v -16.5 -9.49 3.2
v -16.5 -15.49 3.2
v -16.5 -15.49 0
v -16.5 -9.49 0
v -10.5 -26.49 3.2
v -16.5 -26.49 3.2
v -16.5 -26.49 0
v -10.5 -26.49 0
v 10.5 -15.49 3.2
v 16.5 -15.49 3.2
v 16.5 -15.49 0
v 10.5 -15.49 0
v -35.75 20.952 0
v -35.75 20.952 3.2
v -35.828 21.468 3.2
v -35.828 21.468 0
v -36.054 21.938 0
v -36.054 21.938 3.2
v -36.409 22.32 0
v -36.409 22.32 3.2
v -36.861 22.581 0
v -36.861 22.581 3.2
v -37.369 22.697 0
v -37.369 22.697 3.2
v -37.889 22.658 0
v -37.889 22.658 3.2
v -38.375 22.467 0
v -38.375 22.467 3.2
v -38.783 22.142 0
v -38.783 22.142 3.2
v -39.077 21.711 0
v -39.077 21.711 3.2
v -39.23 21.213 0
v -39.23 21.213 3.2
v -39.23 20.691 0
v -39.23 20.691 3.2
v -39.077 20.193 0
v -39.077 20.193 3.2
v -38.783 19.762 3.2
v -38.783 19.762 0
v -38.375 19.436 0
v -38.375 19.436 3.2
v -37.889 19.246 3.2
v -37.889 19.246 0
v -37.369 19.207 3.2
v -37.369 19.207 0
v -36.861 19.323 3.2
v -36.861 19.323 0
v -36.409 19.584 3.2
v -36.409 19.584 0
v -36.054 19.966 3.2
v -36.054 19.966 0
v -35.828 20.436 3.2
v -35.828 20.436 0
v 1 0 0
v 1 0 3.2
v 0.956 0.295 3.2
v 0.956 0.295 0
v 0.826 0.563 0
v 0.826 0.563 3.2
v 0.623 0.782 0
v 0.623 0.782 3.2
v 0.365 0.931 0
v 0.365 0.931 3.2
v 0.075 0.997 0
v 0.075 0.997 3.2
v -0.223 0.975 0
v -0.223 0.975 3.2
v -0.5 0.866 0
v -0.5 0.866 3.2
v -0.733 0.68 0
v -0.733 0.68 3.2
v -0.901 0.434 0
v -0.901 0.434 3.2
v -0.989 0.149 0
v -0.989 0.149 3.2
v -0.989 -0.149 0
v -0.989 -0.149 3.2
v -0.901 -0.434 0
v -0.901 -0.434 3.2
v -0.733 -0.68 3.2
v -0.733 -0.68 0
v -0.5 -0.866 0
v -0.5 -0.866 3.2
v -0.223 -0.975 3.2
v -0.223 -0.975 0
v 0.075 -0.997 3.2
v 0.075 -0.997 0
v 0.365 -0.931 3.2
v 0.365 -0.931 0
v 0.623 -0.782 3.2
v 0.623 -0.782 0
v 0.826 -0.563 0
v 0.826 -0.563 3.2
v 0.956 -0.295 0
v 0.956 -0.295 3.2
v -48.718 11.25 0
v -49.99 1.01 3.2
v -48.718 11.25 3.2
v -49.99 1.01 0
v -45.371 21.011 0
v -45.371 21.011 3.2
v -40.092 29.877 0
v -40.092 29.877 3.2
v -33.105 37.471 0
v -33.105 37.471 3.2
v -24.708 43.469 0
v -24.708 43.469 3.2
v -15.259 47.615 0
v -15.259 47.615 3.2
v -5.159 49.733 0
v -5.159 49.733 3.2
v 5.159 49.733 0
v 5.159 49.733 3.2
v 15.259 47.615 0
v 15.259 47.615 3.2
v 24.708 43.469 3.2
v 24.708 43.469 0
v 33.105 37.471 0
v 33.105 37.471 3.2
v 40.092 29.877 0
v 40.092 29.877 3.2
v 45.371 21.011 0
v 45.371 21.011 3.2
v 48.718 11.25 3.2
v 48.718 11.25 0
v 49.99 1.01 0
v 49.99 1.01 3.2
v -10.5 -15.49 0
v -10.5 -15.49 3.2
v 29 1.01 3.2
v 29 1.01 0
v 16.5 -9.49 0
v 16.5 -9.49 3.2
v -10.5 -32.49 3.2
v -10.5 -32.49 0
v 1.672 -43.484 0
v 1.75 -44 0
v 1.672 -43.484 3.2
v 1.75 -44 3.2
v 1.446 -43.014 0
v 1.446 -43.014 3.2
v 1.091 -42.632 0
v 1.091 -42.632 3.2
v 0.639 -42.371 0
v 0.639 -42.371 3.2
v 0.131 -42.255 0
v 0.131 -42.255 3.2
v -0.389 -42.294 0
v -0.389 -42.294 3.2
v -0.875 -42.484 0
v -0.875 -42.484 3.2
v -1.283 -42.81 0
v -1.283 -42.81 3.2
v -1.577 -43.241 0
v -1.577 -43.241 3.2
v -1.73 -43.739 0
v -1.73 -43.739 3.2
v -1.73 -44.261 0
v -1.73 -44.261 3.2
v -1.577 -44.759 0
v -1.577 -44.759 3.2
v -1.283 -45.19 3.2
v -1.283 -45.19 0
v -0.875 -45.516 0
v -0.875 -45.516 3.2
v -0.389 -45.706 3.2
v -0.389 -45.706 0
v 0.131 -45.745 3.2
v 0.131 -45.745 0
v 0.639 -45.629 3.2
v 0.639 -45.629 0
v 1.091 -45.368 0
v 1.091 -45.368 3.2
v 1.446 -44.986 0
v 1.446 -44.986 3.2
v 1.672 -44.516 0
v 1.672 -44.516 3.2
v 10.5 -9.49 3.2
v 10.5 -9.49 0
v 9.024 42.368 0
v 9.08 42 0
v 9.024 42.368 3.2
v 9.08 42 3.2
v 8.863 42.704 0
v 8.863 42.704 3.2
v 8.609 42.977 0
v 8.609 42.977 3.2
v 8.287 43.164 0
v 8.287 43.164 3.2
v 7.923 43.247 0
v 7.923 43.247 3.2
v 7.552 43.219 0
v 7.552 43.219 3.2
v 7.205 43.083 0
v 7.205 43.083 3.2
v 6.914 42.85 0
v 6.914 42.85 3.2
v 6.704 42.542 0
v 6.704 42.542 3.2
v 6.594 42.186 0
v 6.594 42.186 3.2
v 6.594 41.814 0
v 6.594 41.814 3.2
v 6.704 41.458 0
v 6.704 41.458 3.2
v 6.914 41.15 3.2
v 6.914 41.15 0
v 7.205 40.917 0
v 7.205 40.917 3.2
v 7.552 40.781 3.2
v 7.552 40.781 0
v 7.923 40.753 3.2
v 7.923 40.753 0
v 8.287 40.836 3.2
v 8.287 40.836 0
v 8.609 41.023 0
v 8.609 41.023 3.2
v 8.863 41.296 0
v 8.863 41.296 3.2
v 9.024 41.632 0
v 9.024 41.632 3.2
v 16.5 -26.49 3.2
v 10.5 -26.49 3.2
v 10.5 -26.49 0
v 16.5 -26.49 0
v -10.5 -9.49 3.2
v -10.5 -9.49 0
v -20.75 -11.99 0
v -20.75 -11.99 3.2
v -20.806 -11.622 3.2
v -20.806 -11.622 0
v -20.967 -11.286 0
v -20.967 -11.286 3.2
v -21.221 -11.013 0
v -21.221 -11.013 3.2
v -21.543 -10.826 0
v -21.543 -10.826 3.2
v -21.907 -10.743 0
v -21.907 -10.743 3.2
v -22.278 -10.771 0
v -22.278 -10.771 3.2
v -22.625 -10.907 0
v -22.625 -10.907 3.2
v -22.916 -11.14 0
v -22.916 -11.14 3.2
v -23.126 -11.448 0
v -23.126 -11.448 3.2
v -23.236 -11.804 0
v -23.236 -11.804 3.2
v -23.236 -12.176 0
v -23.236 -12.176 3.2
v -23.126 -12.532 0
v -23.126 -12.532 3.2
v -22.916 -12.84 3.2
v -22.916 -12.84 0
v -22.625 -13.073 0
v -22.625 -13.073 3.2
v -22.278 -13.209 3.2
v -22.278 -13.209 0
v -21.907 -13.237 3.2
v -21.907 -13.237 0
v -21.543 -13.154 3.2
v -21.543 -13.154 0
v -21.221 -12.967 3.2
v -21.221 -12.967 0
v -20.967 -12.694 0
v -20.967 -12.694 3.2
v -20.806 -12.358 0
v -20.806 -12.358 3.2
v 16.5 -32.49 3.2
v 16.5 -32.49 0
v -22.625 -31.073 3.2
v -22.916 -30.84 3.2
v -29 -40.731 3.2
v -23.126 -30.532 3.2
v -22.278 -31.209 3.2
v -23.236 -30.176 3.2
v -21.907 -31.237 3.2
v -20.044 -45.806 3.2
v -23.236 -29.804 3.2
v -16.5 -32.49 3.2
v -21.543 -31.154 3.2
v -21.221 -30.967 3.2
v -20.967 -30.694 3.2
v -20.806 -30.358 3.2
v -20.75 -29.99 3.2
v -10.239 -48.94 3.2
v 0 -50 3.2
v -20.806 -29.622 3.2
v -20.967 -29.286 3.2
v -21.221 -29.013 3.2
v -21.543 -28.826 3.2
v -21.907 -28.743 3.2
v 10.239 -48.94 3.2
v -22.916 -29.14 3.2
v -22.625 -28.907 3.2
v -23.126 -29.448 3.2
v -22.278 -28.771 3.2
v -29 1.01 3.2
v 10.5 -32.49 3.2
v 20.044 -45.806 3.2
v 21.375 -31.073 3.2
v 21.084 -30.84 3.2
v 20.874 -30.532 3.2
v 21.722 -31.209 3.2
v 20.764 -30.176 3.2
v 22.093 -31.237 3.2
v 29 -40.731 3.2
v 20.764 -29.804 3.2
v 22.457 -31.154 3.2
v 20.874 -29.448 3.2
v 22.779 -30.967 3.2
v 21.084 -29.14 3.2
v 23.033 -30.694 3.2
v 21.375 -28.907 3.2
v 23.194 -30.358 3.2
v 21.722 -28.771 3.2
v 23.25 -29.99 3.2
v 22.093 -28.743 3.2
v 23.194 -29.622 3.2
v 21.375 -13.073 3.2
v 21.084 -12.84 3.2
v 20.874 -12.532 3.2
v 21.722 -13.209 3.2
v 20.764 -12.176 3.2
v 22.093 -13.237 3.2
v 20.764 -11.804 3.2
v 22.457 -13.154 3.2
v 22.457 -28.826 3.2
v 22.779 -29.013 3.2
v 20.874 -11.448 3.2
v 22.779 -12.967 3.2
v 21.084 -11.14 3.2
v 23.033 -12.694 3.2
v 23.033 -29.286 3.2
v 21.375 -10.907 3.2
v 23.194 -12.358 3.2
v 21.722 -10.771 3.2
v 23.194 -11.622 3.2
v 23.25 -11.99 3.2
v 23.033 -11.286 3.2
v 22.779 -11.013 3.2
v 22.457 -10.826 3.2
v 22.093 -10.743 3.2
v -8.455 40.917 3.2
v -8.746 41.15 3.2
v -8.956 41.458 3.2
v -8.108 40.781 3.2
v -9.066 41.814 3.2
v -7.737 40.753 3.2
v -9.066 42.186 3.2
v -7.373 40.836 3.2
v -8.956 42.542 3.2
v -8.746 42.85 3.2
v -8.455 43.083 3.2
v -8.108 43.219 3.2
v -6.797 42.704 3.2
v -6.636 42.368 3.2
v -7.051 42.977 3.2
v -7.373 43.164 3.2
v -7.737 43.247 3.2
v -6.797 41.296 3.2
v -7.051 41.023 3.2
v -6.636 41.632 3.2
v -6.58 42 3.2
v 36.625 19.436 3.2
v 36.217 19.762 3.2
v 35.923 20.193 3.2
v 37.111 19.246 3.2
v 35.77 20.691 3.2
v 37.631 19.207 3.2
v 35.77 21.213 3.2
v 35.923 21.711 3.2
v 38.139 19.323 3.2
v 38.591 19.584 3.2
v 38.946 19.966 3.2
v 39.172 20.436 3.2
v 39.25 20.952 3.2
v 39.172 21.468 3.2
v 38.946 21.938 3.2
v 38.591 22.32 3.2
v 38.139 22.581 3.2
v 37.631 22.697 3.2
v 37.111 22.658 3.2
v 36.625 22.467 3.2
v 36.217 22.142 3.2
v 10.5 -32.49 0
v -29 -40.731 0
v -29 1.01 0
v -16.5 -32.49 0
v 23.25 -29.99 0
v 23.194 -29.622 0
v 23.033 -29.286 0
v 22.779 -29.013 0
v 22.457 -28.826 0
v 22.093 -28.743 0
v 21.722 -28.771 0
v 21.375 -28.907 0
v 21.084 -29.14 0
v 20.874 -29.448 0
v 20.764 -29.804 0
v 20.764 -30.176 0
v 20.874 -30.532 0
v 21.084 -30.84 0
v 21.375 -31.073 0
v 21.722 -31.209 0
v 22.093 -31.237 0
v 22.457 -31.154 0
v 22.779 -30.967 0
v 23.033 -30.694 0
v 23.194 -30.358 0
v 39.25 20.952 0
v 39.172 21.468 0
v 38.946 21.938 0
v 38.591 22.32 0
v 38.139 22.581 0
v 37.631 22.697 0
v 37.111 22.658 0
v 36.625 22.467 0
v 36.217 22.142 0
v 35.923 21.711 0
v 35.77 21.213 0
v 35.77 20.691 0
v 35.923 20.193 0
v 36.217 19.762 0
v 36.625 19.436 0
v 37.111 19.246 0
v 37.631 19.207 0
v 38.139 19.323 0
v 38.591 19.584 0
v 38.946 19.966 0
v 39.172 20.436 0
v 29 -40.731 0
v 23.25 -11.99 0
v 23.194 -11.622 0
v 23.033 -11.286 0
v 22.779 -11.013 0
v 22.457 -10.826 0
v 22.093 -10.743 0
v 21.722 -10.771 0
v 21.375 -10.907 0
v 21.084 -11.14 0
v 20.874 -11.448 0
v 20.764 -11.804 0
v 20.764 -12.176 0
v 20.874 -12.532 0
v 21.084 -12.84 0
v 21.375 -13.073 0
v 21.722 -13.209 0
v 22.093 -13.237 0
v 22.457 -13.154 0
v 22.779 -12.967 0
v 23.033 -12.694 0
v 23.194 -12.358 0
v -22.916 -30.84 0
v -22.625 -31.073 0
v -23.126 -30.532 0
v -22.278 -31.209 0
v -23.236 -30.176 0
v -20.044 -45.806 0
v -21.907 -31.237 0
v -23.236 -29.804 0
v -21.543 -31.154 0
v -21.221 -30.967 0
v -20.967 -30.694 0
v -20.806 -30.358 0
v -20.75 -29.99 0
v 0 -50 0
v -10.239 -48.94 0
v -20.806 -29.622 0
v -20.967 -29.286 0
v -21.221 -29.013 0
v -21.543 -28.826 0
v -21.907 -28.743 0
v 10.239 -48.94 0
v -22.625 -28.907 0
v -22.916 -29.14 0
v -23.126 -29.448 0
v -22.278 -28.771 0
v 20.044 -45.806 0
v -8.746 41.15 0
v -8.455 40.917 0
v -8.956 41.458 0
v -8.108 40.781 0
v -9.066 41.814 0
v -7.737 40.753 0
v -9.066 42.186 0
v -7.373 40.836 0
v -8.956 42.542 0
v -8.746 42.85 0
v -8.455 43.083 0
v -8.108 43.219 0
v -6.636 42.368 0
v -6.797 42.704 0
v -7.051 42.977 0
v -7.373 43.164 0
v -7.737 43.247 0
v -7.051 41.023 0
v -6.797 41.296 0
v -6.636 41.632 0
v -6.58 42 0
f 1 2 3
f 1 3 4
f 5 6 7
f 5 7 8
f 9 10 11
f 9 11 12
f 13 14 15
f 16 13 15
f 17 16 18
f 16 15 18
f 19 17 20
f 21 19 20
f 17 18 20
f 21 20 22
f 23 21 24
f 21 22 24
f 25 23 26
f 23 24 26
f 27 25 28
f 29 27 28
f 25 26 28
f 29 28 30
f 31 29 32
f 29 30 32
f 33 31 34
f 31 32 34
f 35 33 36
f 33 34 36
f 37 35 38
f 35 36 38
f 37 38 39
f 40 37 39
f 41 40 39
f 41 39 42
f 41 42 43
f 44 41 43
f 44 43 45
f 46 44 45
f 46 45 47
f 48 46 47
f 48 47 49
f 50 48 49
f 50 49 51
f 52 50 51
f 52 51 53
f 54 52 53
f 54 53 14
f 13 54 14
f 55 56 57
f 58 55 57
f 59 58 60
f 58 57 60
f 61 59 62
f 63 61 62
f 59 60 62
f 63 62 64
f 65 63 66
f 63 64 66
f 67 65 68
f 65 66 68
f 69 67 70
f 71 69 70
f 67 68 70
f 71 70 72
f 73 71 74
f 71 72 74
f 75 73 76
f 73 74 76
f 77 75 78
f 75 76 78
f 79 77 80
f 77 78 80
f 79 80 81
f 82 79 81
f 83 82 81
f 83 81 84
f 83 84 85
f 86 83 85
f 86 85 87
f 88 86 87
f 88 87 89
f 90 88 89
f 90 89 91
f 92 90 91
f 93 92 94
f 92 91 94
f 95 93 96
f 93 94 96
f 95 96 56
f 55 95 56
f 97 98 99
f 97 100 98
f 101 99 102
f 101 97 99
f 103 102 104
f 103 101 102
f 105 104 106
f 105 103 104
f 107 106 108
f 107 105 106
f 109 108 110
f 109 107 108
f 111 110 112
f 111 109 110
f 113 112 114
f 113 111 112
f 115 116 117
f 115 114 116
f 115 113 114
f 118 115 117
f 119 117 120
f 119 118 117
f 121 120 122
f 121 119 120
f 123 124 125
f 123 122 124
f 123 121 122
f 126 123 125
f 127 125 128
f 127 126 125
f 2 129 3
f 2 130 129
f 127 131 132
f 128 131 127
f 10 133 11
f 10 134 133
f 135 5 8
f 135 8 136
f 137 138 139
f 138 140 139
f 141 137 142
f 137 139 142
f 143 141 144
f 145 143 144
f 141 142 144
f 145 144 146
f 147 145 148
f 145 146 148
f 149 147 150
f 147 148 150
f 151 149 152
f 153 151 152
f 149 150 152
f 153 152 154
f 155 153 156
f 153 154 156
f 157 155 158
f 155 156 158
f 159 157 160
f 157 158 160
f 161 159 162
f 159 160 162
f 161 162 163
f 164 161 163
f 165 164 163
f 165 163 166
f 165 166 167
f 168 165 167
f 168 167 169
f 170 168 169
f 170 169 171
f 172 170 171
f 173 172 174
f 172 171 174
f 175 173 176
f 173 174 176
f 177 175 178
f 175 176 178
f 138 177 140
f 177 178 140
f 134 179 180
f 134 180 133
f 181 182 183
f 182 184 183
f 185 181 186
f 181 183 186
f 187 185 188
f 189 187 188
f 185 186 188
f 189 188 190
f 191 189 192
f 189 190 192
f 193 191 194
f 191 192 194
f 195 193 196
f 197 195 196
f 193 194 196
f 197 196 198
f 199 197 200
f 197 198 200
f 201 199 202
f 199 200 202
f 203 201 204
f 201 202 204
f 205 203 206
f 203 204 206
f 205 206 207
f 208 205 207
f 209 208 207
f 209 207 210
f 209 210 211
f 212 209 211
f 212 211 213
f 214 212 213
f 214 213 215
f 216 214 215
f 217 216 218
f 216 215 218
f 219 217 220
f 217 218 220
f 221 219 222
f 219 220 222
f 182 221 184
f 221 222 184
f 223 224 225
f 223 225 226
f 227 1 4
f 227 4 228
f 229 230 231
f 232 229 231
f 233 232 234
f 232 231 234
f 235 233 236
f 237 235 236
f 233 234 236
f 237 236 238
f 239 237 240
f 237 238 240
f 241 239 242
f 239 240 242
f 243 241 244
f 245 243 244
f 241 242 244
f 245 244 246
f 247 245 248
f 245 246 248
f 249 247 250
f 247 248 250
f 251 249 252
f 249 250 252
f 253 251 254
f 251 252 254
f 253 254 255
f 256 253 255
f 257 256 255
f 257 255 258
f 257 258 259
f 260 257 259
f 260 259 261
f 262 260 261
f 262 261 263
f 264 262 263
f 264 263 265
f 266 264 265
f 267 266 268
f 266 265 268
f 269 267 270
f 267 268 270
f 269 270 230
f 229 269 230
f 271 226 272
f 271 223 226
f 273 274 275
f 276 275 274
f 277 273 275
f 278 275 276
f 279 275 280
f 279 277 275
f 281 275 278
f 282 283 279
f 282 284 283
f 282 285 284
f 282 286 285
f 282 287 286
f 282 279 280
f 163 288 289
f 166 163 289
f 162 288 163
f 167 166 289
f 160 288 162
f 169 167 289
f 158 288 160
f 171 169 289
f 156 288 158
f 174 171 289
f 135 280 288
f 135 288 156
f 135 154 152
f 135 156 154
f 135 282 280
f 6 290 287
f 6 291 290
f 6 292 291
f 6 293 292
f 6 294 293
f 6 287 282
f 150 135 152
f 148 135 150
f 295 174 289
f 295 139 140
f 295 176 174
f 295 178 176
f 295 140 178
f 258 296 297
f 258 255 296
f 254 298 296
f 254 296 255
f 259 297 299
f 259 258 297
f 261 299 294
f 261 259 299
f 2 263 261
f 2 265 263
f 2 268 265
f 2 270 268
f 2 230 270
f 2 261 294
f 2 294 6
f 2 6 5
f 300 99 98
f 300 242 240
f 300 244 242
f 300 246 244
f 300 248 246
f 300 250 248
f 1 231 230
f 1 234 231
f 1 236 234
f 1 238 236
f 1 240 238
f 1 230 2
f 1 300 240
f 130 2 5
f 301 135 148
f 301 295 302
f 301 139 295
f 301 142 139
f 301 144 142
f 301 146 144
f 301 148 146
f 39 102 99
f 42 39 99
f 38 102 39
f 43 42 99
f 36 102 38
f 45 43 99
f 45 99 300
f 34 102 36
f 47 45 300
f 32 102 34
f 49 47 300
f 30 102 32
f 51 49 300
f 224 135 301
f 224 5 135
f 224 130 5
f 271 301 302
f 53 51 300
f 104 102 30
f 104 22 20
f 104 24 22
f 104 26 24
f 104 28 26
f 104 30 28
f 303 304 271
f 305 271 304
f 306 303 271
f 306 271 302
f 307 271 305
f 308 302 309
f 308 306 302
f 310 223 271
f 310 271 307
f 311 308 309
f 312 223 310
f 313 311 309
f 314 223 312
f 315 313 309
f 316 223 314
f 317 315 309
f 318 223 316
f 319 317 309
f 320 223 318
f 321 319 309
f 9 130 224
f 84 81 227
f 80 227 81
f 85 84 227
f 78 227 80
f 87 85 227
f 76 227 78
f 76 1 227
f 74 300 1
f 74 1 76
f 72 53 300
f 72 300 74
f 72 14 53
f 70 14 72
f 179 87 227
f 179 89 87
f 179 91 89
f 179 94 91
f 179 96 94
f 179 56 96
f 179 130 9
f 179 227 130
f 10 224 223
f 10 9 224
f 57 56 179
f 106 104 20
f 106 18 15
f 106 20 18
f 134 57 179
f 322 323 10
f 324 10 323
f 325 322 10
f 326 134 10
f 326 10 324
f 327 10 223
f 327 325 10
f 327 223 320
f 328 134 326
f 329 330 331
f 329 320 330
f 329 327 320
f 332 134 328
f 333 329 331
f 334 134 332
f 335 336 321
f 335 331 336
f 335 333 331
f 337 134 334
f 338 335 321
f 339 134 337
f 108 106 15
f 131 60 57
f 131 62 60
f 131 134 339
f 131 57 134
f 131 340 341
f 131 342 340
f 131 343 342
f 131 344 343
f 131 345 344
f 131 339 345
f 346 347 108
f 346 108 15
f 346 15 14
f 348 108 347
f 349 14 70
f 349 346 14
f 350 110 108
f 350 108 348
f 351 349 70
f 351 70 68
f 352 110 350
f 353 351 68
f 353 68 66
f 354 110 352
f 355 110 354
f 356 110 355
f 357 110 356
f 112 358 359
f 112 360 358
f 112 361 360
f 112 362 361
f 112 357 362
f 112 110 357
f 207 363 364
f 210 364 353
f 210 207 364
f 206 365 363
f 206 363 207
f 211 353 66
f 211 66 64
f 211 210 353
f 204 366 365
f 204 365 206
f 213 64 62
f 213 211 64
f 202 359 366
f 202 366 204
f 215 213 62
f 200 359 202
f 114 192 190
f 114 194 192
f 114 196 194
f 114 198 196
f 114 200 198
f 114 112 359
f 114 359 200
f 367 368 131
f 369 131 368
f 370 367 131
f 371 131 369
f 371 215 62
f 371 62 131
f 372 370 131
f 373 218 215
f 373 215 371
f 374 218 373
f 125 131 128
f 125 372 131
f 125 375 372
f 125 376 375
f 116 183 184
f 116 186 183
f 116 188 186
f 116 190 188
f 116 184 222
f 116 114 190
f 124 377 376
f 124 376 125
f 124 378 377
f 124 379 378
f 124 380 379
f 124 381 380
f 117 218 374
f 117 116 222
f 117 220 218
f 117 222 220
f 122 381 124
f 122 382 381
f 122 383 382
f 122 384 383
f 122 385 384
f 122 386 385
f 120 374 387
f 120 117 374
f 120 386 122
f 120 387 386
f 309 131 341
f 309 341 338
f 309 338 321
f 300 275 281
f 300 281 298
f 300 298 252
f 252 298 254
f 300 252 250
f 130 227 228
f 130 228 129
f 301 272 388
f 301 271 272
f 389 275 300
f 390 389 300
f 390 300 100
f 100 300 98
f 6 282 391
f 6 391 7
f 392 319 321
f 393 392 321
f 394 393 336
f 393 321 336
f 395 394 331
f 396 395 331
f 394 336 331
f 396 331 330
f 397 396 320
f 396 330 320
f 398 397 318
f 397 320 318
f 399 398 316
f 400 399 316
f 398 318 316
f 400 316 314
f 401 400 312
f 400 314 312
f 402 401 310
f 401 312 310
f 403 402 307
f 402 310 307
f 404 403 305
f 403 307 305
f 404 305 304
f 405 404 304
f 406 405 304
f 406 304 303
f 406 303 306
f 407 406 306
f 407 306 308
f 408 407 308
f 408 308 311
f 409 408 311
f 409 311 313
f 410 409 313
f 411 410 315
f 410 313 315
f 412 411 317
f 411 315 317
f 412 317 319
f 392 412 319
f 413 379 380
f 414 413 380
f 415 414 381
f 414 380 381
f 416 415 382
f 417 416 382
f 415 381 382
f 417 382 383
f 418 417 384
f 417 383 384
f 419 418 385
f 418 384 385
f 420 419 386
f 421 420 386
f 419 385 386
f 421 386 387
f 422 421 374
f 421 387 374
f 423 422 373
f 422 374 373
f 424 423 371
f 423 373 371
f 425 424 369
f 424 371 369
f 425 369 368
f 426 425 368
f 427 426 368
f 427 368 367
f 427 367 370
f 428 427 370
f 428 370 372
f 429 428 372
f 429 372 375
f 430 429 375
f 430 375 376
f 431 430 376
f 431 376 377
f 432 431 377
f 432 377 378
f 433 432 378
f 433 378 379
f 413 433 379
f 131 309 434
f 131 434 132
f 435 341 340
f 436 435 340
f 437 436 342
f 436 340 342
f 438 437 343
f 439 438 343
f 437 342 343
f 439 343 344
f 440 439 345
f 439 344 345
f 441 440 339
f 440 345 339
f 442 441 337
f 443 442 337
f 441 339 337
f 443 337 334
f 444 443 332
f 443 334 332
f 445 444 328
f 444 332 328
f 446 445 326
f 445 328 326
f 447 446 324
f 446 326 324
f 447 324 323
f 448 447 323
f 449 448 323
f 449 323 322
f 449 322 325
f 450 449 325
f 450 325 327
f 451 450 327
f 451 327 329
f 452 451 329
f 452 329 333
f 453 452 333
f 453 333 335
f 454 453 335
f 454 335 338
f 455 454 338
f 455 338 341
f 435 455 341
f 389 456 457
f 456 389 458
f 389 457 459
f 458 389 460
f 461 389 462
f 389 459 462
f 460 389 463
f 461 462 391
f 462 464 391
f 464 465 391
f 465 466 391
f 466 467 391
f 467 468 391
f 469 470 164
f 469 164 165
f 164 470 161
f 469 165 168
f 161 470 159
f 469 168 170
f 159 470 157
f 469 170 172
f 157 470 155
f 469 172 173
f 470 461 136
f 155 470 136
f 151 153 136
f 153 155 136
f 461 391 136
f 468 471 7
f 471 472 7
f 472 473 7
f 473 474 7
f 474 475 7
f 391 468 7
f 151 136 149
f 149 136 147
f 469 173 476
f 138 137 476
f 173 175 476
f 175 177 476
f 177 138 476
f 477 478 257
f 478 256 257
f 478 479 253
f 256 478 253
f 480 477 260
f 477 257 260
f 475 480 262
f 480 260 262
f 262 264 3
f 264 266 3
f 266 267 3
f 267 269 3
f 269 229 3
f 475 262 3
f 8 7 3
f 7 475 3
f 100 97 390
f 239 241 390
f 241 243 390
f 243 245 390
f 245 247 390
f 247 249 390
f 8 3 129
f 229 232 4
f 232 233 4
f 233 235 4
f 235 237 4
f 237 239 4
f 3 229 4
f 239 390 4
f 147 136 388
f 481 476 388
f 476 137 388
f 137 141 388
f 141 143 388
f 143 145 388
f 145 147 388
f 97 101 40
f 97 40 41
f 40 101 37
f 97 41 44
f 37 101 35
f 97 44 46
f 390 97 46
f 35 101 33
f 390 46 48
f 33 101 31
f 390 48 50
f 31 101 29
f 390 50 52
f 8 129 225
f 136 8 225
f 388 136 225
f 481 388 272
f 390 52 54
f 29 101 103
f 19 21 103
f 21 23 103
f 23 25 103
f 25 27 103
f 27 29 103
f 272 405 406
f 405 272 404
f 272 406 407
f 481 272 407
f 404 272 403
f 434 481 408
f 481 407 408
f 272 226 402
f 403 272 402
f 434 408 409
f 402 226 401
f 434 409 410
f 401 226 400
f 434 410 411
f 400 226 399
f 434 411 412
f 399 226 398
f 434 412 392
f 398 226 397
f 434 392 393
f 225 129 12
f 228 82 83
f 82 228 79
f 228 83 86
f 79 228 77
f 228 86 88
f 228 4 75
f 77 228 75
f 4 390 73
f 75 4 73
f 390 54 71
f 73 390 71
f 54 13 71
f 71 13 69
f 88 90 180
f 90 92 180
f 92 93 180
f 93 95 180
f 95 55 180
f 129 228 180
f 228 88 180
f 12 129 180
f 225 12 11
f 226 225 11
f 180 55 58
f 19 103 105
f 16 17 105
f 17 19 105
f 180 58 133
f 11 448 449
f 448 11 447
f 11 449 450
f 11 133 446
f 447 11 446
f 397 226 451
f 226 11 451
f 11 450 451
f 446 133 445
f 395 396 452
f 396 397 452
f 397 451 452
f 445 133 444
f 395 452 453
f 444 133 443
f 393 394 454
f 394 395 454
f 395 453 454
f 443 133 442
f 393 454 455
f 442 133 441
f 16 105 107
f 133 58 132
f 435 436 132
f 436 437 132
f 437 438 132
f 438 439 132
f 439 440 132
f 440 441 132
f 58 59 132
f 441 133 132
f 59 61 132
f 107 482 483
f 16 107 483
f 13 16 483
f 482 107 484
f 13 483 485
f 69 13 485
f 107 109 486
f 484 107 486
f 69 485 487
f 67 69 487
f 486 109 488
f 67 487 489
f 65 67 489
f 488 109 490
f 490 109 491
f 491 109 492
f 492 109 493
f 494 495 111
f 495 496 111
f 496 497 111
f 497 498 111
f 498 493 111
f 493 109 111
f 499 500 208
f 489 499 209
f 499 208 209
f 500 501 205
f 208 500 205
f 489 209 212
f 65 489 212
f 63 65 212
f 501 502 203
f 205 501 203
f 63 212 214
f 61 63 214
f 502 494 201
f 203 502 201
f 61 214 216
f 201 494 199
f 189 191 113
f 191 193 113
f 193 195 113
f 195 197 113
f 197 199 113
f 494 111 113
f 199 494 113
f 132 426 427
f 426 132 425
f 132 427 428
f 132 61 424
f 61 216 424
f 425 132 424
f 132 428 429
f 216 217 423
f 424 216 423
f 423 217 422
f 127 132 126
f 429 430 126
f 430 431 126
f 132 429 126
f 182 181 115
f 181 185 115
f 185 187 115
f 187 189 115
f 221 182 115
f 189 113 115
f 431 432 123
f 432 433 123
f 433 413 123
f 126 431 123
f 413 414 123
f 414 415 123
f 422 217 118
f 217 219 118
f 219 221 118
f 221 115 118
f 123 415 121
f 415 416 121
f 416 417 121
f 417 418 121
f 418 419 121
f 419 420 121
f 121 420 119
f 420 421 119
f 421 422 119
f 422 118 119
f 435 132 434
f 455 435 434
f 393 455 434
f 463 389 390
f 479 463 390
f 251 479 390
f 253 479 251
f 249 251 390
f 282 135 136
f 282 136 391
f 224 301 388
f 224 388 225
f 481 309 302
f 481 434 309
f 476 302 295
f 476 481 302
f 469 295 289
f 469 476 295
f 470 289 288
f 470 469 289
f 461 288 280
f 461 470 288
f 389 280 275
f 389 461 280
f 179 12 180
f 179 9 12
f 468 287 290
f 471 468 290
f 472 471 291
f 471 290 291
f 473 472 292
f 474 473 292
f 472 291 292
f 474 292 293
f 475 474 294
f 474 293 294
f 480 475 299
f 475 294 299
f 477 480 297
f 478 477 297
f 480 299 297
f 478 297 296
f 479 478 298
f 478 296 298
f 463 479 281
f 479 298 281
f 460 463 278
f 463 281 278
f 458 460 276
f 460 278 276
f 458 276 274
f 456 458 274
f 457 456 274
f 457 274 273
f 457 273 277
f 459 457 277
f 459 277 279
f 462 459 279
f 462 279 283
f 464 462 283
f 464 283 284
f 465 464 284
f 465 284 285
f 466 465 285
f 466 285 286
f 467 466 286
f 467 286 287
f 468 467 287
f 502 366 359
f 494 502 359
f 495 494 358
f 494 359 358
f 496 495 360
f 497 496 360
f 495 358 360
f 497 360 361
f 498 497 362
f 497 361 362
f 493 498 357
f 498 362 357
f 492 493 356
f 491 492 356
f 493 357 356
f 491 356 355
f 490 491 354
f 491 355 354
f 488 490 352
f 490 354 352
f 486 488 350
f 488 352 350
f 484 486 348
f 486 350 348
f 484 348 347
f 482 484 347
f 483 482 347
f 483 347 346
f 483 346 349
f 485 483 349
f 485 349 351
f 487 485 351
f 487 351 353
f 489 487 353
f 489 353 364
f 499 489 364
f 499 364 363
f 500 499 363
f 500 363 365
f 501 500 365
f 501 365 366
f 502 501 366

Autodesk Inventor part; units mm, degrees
ref_plane "YZ Plane" through (0, 0, 0) normal (1, 0, 0) x (0, 1, 0)
ref_plane "XZ Plane" through (0, 0, 0) normal (0, 1, 0) x (-1, 0, 0)
ref_plane "XY Plane" through (0, 0, 0) normal (0, 0, 1) x (1, 0, 0)
sketch "Boceto1" plane through (0, 0, 0) normal (0, 0, 1) x (1, 0, 0)
  circle A0 centre (0, 0) radius 50
  dimension "d0" = 100
extrude "Extrusión1" add sketch "Boceto1" along normal blind 3.2
sketch "Boceto2" plane through (0, 0, 3.2) normal (0, 0, 1) x (1, 0, 0)
  circle A0 centre (-22, -11.99) radius 1.25
  circle A1 centre (-22, -29.99) radius 1.25
  circle A2 centre (22, -29.99) radius 1.25
  circle A3 centre (22, -11.99) radius 1.25
  line L0 (-29, 1.01) -> (-59, 1.01)
  line L1 (-59, 1.01) -> (-59, -41.99)
  line L2 (-59, -41.99) -> (-29, -41.99)
  line L3 (-29, -41.99) -> (-29, 1.01)
  line L4 (29, 1.01) -> (59, 1.01)
  line L5 (59, 1.01) -> (59, -41.99)
  line L6 (59, -41.99) -> (29, -41.99)
  line L7 (29, -41.99) -> (29, 1.01)
  circle A4 centre (0, 0) radius 4.16 construction
  line L8 (-4.16, 4.16) -> (4.16, 4.16) construction
  line L9 (4.16, 4.16) -> (4.16, -11.99) construction
  line L10 (4.16, -11.99) -> (-4.16, -11.99) construction
  line L11 (-4.16, -11.99) -> (-4.16, 4.16) construction
  dimension "d3" = 2.5
  dimension "d4" = 44
  dimension "d5" = 22
  dimension "d6" = 18
  dimension "d7" = 43
  dimension "d8" = 30
  dimension "d9" = 12
  dimension "d10" = 7
  dimension "d11" = 7
  dimension "d12" = 8.32
  dimension "d13" = 16.15
extrude "Extrusión2" cut sketch "Boceto2" against normal through all
sketch "Boceto3" plane through (0, 0, 3.2) normal (0, 0, 1) x (1, 0, 0)
  circle A0 centre (-7.83, 42) radius 1.25
  circle A1 centre (7.83, 42) radius 1.25
  arc A2 (49.9898, 1.01) -> (-49.9898, 1.01) centre (0, 0) ccw projected
  dimension "d16" = 15.66
  dimension "d17" = 2.5
  dimension "d18" = 7.83
  dimension "d19" = 42
extrude "Extrusión3" cut sketch "Boceto3" against normal through all
sketch "Boceto4" plane through (0, 0, 3.2) normal (0, 0, 1) x (1, 0, 0)
  line L0 (-16.5, -9.49) -> (-10.5, -9.49)
  line L1 (-10.5, -9.49) -> (-10.5, -15.49)
  line L2 (-10.5, -15.49) -> (-16.5, -15.49)
  line L3 (-16.5, -15.49) -> (-16.5, -9.49)
  line L4 (10.5, -9.49) -> (16.5, -9.49)
  line L5 (16.5, -9.49) -> (16.5, -15.49)
  line L6 (16.5, -15.49) -> (10.5, -15.49)
  line L7 (10.5, -15.49) -> (10.5, -9.49)
  circle A0 centre (-22, -11.99) radius 1.25 projected
  circle A1 centre (22, -11.99) radius 1.25 projected
  line L8 (-16.5, -26.49) -> (-10.5, -26.49)
  line L9 (-10.5, -26.49) -> (-10.5, -32.49)
  line L10 (-10.5, -32.49) -> (-16.5, -32.49)
  line L11 (-16.5, -32.49) -> (-16.5, -26.49)
  line L12 (10.5, -26.49) -> (16.5, -26.49)
  line L13 (16.5, -26.49) -> (16.5, -32.49)
  line L14 (16.5, -32.49) -> (10.5, -32.49)
  line L15 (10.5, -32.49) -> (10.5, -26.49)
  circle A2 centre (-22, -29.99) radius 1.25 projected
  point P0 (0, 0)
  dimension "d22" = 6
  dimension "d23" = 5.5
  dimension "d24" = 5.5
  dimension "d25" = 2.5
  dimension "d26" = 6
  dimension "d27" = 6
  dimension "d28" = 6
  dimension "d32" = 2.5
extrude "Extrusión4" cut sketch "Boceto4" against normal through all contours L0 L1 L2 L3 | L4 L5 L6 L7 | L8 L9 L10 L11 | L12 L13 L14 L15
sketch "Boceto5" plane through (0, 0, 3.2) normal (0, 0, 1) x (1, 0, 0)
  circle A0 centre (0, -44) radius 1.75
  arc A1 (49.9898, 1.01) -> (-49.9898, 1.01) centre (0, 0) ccw projected
  circle A2 centre (-37.5, 20.9519) radius 1.75
  circle A3 centre (37.5, 20.9519) radius 1.75
  point P0 (-27.1448, -41.99)
  point P1 (27.1448, -41.99)
  dimension "d33" = 3.5
  dimension "d34" = 44
  dimension "d35" = 37.5
  dimension "d36" = 37.5
  dimension "d37" = 75
extrude "Extrusión5" cut sketch "Boceto5" against normal through all
sketch "Boceto6" plane through (0, 0, 3.2) normal (0, 0, 1) x (1, 0, 0)
  circle A0 centre (0, 0) radius 1
  dimension "d41" = 2
extrude "Extrusión6" cut sketch "Boceto6" against normal through all
sketch "Boceto7" plane through (0, 0, 3.2) normal (0, 0, 1) x (1, 0, 0)
  circle A0 centre (0, 0) radius 1 projected
  line L0 (0, 0) -> (-40, -20.99)
  line L1 (-16.5, -26.49) -> (-10.5, -26.49) projected
  line L2 (-10.5, -15.49) -> (-16.5, -15.49) projected
  line L3 (-29, 1.01) -> (-29, -40.7308) projected
  line L4 (0, 0) -> (40, -20.99)
  line L5 (29, -40.7308) -> (29, 1.01) projected
  line L6 (0, 0) -> (0, -20.99)
  dimension "d44" = 11
  dimension "d45" = 5.5
  dimension "d46" = 11
  dimension "d47" = 45.1728
  dimension "d48" = 11
  dimension "d49" = 45.1728
  dimension "d50" = 80
  dimension "d51" = 20.99
equation "\"d5\" = 0.5 * d4"
equation "\"d18\" = 0.5 * d16"
equation "\"d36\" = d35"
equation "\"d37\" = 2 * d35"
properties part number "Base"
